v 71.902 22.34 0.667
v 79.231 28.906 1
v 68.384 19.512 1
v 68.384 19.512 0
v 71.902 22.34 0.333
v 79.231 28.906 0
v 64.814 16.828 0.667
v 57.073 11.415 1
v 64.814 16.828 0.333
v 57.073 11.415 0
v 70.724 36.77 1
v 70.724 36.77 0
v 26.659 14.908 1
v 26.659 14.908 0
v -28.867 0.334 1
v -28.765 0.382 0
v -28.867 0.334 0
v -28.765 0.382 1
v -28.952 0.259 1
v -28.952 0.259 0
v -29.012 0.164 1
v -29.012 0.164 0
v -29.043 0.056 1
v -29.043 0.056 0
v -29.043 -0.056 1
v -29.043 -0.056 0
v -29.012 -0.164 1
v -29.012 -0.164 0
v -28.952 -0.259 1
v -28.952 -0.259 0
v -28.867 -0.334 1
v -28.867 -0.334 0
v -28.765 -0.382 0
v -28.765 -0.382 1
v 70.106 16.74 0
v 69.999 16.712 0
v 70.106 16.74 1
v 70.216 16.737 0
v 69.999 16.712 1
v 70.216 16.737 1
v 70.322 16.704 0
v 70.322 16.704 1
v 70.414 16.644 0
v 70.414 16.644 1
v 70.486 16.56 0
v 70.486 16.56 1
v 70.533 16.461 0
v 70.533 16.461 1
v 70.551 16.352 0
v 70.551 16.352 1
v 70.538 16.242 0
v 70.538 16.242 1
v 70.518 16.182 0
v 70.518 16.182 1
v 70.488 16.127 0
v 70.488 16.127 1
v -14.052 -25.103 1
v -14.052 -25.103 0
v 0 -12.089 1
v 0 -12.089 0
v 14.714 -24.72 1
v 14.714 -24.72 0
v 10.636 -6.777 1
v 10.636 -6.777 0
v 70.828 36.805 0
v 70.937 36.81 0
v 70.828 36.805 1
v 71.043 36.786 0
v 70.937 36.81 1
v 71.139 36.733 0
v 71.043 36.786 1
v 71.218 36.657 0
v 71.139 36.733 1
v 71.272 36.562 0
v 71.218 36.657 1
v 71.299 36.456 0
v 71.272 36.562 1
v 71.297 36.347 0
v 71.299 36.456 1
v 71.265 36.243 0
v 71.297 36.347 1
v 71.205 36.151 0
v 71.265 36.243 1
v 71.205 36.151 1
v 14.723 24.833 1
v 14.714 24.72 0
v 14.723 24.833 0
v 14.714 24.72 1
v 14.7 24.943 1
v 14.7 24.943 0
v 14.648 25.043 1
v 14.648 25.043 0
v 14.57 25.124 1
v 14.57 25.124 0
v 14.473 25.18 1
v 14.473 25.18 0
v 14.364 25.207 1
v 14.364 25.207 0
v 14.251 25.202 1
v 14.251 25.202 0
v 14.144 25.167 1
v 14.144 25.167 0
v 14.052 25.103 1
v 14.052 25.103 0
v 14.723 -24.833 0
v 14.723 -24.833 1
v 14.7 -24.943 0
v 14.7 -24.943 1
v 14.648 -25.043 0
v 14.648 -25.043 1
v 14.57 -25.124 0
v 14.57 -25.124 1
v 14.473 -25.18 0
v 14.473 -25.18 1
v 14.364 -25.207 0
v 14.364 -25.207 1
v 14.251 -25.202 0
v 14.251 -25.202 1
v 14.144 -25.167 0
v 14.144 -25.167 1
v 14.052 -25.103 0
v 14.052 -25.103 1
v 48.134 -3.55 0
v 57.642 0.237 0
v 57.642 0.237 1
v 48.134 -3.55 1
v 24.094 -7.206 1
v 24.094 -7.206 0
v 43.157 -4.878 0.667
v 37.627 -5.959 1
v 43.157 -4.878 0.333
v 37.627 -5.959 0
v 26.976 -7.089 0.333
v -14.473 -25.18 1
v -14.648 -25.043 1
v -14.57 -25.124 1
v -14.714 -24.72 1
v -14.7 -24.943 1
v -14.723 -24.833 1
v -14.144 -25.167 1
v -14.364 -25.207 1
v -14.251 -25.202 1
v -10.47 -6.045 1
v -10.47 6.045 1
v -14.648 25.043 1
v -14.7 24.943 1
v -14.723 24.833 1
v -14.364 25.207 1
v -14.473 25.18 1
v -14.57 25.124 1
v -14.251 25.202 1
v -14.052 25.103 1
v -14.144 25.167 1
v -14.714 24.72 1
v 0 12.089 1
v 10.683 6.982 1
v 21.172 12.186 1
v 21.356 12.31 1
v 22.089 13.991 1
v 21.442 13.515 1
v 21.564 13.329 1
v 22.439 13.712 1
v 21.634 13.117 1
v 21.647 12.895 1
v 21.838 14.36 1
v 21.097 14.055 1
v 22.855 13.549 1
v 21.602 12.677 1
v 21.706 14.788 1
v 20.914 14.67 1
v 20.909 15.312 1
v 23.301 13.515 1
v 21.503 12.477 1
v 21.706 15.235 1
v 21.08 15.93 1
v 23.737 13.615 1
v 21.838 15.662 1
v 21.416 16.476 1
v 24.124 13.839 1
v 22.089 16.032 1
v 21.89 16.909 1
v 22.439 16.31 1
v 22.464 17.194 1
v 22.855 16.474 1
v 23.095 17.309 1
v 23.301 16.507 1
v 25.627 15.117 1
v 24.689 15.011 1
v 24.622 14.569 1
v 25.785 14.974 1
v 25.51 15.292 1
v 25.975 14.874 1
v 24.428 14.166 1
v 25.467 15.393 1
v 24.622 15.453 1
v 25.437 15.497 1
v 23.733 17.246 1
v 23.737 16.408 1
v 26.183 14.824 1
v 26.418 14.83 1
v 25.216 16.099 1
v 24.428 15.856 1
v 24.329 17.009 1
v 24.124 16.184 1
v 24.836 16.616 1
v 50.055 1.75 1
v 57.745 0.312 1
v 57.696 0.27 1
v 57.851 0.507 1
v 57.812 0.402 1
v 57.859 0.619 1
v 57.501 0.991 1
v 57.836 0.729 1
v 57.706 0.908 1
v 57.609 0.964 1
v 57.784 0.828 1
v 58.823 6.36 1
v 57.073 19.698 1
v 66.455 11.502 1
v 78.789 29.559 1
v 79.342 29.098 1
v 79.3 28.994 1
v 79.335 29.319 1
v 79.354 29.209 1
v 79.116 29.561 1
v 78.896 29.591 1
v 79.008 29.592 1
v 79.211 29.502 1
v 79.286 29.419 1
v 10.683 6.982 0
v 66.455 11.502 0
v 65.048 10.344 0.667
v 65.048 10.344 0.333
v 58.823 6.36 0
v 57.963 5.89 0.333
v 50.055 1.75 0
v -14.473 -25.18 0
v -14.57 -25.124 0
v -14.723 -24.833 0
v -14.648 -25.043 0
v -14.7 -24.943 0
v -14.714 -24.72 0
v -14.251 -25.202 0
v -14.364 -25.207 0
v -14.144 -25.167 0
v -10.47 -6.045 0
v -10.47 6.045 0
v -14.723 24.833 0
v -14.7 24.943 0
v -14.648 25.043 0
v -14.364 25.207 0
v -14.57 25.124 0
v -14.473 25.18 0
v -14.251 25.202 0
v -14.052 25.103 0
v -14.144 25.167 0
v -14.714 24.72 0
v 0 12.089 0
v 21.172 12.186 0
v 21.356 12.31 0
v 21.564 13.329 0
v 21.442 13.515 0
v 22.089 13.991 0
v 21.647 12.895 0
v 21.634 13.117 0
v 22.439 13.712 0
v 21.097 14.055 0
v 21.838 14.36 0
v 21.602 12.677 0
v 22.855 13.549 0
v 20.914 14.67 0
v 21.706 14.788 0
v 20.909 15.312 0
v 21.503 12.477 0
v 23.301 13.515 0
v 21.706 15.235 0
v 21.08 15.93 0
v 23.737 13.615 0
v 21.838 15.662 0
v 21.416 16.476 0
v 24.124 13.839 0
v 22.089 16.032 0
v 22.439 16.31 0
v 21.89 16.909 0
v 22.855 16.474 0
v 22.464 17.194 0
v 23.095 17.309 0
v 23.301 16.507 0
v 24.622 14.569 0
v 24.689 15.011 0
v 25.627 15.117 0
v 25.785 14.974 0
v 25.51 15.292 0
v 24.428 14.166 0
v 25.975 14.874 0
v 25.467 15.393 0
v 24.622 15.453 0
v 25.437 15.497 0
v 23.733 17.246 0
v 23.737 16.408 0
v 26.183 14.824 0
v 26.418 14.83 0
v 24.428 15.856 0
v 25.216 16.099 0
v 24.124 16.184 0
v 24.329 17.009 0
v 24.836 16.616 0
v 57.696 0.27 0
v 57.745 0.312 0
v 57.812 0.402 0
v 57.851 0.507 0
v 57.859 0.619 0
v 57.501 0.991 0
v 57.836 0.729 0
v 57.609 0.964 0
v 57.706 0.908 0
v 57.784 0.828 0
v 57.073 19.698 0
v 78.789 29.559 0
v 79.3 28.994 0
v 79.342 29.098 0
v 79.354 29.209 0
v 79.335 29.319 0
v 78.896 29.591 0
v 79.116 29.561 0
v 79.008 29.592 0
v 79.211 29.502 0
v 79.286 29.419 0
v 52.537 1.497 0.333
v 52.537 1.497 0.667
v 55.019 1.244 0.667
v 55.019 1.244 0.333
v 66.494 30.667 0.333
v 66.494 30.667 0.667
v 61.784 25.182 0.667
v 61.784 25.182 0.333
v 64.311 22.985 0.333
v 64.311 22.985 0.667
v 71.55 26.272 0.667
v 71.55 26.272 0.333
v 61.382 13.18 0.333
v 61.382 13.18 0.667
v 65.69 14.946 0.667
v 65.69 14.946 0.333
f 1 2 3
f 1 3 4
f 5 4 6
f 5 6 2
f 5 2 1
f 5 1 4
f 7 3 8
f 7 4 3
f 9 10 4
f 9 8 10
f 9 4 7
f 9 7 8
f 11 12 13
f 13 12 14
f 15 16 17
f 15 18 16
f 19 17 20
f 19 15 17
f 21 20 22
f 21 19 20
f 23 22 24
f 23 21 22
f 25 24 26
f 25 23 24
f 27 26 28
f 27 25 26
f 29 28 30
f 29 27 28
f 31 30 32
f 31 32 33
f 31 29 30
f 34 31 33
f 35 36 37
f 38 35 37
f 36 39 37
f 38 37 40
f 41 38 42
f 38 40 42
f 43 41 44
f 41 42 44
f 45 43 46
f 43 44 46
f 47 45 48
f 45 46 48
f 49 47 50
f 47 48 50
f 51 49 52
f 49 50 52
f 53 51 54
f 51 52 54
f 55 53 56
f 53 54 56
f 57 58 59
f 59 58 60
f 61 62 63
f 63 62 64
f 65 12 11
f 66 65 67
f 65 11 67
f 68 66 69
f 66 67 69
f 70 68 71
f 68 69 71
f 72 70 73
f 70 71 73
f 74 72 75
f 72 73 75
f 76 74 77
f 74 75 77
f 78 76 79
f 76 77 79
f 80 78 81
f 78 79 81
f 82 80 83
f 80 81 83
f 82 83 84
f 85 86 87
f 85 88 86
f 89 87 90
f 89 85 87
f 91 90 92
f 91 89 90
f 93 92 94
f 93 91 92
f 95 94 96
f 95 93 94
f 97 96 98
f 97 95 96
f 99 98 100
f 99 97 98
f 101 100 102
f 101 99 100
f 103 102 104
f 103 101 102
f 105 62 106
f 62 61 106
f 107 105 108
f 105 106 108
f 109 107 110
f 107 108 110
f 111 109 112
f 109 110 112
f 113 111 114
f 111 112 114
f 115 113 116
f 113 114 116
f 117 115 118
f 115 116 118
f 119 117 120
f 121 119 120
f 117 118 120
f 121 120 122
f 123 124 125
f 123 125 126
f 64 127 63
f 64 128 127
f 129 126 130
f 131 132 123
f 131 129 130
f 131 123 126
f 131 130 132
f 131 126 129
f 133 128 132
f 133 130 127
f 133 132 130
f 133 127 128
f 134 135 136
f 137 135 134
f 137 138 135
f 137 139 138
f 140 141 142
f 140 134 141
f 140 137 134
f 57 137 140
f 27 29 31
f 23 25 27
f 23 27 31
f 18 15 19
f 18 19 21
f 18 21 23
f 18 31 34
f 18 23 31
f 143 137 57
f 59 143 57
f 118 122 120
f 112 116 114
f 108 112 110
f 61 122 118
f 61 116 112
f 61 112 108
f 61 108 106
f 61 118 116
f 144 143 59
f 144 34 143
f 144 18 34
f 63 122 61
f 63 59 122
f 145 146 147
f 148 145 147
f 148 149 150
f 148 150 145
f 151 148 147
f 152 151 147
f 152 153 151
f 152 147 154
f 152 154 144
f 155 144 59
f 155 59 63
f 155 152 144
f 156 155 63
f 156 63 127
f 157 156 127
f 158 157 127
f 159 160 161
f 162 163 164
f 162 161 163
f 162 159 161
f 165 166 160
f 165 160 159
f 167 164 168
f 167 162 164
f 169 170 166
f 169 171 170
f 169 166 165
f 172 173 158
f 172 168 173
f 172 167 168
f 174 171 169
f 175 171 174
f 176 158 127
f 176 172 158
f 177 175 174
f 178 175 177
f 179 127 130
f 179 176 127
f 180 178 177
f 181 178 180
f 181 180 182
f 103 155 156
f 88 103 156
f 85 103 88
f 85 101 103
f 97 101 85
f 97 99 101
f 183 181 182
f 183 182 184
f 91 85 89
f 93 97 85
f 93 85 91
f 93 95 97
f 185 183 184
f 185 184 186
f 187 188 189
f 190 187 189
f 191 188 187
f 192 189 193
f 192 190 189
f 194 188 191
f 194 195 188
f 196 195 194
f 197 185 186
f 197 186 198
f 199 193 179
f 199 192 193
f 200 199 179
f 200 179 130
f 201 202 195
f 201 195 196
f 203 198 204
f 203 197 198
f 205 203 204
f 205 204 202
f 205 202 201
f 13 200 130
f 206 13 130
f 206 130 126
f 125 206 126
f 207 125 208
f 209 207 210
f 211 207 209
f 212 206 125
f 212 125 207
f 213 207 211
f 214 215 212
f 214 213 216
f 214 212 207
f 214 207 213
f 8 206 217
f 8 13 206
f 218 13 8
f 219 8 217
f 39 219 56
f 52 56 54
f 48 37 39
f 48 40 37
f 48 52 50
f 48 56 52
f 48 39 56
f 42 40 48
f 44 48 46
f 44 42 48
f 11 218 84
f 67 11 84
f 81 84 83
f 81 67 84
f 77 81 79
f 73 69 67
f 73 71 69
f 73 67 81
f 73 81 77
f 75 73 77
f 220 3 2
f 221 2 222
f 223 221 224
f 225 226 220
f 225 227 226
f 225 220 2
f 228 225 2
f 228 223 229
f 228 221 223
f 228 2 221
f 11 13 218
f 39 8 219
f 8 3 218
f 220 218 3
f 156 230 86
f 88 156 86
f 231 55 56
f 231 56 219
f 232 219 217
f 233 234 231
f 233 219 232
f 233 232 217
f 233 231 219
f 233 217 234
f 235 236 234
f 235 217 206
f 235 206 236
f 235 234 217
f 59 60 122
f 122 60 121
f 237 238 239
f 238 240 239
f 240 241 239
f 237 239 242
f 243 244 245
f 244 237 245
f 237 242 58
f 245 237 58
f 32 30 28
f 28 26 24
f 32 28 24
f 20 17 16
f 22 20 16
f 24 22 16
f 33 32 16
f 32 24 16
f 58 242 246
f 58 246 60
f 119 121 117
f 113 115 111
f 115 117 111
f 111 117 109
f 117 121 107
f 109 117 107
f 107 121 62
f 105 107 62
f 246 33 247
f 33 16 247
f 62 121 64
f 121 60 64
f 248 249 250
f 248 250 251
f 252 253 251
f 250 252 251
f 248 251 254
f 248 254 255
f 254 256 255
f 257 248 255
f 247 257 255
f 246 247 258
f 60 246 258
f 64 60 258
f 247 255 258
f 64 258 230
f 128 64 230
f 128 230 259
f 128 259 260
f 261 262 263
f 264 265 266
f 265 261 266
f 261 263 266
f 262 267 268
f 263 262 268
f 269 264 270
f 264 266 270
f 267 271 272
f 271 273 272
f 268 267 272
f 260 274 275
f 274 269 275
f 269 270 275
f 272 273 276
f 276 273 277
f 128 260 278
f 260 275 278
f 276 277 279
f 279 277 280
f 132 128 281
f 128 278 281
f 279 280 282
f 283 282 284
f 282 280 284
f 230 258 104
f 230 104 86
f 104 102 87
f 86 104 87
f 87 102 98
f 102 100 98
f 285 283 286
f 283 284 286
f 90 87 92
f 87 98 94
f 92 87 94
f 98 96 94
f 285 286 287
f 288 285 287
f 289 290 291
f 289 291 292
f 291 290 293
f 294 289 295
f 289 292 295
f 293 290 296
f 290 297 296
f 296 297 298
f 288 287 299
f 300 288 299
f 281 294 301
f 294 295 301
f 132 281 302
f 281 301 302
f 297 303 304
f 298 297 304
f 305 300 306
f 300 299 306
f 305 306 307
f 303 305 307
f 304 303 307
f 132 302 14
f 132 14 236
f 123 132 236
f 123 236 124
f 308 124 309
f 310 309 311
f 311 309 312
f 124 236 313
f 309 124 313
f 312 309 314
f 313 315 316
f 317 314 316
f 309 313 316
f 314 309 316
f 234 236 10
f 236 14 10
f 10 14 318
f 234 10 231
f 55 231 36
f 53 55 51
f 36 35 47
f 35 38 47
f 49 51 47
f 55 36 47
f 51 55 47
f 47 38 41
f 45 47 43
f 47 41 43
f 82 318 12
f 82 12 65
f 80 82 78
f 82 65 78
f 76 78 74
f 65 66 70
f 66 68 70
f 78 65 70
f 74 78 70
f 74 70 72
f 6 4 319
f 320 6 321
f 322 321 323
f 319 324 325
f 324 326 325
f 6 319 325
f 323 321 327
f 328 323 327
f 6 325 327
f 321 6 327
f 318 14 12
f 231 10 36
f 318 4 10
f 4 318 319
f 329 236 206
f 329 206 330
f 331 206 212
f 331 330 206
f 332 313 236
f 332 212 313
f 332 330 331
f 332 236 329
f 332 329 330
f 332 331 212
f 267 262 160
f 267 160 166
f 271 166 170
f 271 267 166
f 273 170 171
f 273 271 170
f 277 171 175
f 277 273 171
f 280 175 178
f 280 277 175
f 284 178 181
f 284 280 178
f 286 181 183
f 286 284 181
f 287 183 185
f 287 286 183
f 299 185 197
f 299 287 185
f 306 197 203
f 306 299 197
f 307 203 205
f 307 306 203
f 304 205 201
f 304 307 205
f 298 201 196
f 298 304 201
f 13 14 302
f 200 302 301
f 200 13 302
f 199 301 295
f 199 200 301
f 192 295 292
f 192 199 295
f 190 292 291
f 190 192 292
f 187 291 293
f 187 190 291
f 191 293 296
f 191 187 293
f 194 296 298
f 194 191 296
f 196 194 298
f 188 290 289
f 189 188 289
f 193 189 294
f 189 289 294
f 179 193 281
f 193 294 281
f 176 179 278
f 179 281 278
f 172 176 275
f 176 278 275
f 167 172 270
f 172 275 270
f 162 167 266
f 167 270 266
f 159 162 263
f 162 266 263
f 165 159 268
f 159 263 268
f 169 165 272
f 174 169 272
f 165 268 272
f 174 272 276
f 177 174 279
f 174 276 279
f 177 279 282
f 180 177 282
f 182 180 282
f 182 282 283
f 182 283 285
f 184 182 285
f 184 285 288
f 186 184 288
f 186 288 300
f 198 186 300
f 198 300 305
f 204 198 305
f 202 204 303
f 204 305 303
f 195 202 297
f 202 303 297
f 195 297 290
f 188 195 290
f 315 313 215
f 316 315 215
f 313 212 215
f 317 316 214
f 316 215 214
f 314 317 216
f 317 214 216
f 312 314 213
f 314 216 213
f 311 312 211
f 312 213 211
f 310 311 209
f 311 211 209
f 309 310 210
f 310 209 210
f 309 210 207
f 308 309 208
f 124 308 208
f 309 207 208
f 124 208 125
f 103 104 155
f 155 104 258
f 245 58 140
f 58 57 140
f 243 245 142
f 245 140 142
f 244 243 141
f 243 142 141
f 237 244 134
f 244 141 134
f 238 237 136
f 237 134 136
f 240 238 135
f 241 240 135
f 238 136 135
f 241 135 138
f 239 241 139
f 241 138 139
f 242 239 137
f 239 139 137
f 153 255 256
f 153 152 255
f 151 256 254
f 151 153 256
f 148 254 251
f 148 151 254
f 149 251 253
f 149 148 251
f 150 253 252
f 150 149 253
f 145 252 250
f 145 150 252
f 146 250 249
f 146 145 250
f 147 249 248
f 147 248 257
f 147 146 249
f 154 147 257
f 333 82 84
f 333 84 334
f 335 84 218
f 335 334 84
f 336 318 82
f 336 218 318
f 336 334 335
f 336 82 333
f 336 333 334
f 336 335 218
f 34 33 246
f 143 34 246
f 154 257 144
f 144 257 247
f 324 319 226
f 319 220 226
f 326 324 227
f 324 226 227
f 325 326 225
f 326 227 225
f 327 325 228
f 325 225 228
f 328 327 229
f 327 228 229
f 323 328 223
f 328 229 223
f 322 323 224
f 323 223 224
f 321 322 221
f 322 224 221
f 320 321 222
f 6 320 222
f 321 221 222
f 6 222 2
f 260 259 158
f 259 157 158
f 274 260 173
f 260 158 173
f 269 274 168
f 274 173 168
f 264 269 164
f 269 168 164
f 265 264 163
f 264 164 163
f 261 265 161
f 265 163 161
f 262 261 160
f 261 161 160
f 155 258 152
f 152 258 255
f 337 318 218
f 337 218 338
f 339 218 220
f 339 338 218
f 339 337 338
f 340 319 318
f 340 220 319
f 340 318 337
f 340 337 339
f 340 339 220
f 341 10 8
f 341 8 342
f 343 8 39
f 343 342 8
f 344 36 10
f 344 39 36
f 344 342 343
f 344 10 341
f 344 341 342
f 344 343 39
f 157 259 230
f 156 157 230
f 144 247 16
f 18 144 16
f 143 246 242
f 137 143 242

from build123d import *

# Parameters (mm, degrees)
F2_DEPTH = 1
F3_DEPTH = 1
F4_R     = 1.5
F5_DEPTH = 1
F6_R     = 0.8594833568
F7_R     = 0.4


with BuildPart() as f2:
    # F0 (on Top) → F2 (new body)
    with BuildSketch(Plane.XY):
        Polygon((0, 12.0893299047), (-15, 25.9807621135), (-10.4696668122, 6.0446649524), (-30, 0), (-10.4696668122, -6.0446649524), (-15, -25.9807621135), (0, -12.0893299047), (15, -25.9807621135), (10.4696668122, -6.0446649524), (30, 0), (10.4696668122, 6.0446649524), (15, 25.9807621135), align=None)
    extrude(amount=F2_DEPTH)

    # F1 (on Top) → F3 (join)
    with BuildSketch(Plane.XY):
        with BuildLine():
            Line((72.4891722202, 37.6455299556), (7.3894136585, 5.3482959047))
            Line((7.3894136585, 5.3482959047), (7.7781090513, -6.4794942737))
            add(Edge.make_bspline(
                [(58.8173978031, 0.8565816097), (44.8322221637, -6.7676748149), (24.8244935647, -8.4759178571), (7.7781090513, -6.4794942737)],
                knots=[0, 0, 0, 0, 51.5638148865, 51.5638148865, 51.5638148865, 51.5638148865], degree=3))
            add(Edge.make_bspline(
                [(50.0547550619, 1.7504660645), (52.9756359756, 1.4525045796), (55.8965168893, 1.1545430946), (58.8173978031, 0.8565816097)],
                knots=[0, 0, 0, 0, 8.8081176893, 8.8081176893, 8.8081176893, 8.8081176893], degree=3))
            add(Edge.make_bspline(
                [(71.1085945368, 17.1669367701), (66.9464543462, 9.6644256264), (58.5000440478, 6.2858634628), (50.0547550619, 1.7504660645)],
                knots=[0, 0, 0, 0, 26.0946685292, 26.0946685292, 26.0946685292, 26.0946685292], degree=3))
            add(Edge.make_bspline(
                [(57.0727027953, 11.4145213738), (61.7513333758, 13.3319931726), (66.4299639563, 15.2494649713), (71.1085945368, 17.1669367701)],
                knots=[0, 0, 0, 0, 15.1689333795, 15.1689333795, 15.1689333795, 15.1689333795], degree=3))
            add(Edge.make_bspline(
                [(80.8876976371, 30.5125359446), (72.3214372993, 22.1036802977), (66.0250261426, 17.496548593), (57.0727027953, 11.4145213738)],
                knots=[0, 0, 0, 0, 30.5268429396, 30.5268429396, 30.5268429396, 30.5268429396], degree=3))
            add(Edge.make_bspline(
                [(57.0727027953, 19.6979995817), (65.0110344092, 23.302845036), (72.9493660231, 26.9076904903), (80.8876976371, 30.5125359446)],
                knots=[0, 0, 0, 0, 26.155461687, 26.155461687, 26.155461687, 26.155461687], degree=3))
            add(Edge.make_bspline(
                [(72.4891722202, 37.6455299556), (67.3503490786, 31.663019831), (62.2115259369, 25.6805097063), (57.0727027953, 19.6979995817)],
                knots=[0, 0, 0, 0, 23.6596994075, 23.6596994075, 23.6596994075, 23.6596994075], degree=3))
        make_face()
    extrude(amount=F3_DEPTH)

    # F4 (on face) → F5 (join)
    with BuildSketch(Plane(origin=(0, 0, 0), x_dir=(1, 0, 0), z_dir=(0, 0, -1))):
        with BuildLine():
            ThreePointArc((22.4657231152, -12.8279410816), (21.8424371227, -16.8758669464), (25.489, -15.011257492))
            ThreePointArc((25.489, -15.011257492), (25.4577954947, -14.6336770325), (25.3650286927, -14.2663419742))
            Line((25.3650286927, -14.2663419742), (22.4657231152, -12.8279410816))
        make_face()
        with Locations((23.189, -15.011257492)):
            Circle(F4_R, mode=Mode.SUBTRACT)
    extrude(amount=-F5_DEPTH)

    # F6
    f6_edges = [f2.edges().sort_by_distance(p)[0] for p in [
        (25.489, 15.011257, 0.5),
        (25.365029, 14.266342, 0.5),
        (22.465723, 12.827941, 0.5),
    ]]
    fillet(f6_edges, radius=F6_R)

    # F7
    f7_edges = [f2.edges().sort_by_distance(p)[0] for p in [
        (15, 25.980762, 0.5),
        (-15, 25.980762, 0.5),
        (-30, 0, 0.5),
        (-15, -25.980762, 0.5),
        (15, -25.980762, 0.5),
        (72.489172, 37.64553, 0.5),
        (80.887698, 30.512536, 0.5),
        (71.108595, 17.166937, 0.5),
        (58.817398, 0.856582, 0.5),
    ]]
    fillet(f7_edges, radius=F7_R)


solid = f2.part
